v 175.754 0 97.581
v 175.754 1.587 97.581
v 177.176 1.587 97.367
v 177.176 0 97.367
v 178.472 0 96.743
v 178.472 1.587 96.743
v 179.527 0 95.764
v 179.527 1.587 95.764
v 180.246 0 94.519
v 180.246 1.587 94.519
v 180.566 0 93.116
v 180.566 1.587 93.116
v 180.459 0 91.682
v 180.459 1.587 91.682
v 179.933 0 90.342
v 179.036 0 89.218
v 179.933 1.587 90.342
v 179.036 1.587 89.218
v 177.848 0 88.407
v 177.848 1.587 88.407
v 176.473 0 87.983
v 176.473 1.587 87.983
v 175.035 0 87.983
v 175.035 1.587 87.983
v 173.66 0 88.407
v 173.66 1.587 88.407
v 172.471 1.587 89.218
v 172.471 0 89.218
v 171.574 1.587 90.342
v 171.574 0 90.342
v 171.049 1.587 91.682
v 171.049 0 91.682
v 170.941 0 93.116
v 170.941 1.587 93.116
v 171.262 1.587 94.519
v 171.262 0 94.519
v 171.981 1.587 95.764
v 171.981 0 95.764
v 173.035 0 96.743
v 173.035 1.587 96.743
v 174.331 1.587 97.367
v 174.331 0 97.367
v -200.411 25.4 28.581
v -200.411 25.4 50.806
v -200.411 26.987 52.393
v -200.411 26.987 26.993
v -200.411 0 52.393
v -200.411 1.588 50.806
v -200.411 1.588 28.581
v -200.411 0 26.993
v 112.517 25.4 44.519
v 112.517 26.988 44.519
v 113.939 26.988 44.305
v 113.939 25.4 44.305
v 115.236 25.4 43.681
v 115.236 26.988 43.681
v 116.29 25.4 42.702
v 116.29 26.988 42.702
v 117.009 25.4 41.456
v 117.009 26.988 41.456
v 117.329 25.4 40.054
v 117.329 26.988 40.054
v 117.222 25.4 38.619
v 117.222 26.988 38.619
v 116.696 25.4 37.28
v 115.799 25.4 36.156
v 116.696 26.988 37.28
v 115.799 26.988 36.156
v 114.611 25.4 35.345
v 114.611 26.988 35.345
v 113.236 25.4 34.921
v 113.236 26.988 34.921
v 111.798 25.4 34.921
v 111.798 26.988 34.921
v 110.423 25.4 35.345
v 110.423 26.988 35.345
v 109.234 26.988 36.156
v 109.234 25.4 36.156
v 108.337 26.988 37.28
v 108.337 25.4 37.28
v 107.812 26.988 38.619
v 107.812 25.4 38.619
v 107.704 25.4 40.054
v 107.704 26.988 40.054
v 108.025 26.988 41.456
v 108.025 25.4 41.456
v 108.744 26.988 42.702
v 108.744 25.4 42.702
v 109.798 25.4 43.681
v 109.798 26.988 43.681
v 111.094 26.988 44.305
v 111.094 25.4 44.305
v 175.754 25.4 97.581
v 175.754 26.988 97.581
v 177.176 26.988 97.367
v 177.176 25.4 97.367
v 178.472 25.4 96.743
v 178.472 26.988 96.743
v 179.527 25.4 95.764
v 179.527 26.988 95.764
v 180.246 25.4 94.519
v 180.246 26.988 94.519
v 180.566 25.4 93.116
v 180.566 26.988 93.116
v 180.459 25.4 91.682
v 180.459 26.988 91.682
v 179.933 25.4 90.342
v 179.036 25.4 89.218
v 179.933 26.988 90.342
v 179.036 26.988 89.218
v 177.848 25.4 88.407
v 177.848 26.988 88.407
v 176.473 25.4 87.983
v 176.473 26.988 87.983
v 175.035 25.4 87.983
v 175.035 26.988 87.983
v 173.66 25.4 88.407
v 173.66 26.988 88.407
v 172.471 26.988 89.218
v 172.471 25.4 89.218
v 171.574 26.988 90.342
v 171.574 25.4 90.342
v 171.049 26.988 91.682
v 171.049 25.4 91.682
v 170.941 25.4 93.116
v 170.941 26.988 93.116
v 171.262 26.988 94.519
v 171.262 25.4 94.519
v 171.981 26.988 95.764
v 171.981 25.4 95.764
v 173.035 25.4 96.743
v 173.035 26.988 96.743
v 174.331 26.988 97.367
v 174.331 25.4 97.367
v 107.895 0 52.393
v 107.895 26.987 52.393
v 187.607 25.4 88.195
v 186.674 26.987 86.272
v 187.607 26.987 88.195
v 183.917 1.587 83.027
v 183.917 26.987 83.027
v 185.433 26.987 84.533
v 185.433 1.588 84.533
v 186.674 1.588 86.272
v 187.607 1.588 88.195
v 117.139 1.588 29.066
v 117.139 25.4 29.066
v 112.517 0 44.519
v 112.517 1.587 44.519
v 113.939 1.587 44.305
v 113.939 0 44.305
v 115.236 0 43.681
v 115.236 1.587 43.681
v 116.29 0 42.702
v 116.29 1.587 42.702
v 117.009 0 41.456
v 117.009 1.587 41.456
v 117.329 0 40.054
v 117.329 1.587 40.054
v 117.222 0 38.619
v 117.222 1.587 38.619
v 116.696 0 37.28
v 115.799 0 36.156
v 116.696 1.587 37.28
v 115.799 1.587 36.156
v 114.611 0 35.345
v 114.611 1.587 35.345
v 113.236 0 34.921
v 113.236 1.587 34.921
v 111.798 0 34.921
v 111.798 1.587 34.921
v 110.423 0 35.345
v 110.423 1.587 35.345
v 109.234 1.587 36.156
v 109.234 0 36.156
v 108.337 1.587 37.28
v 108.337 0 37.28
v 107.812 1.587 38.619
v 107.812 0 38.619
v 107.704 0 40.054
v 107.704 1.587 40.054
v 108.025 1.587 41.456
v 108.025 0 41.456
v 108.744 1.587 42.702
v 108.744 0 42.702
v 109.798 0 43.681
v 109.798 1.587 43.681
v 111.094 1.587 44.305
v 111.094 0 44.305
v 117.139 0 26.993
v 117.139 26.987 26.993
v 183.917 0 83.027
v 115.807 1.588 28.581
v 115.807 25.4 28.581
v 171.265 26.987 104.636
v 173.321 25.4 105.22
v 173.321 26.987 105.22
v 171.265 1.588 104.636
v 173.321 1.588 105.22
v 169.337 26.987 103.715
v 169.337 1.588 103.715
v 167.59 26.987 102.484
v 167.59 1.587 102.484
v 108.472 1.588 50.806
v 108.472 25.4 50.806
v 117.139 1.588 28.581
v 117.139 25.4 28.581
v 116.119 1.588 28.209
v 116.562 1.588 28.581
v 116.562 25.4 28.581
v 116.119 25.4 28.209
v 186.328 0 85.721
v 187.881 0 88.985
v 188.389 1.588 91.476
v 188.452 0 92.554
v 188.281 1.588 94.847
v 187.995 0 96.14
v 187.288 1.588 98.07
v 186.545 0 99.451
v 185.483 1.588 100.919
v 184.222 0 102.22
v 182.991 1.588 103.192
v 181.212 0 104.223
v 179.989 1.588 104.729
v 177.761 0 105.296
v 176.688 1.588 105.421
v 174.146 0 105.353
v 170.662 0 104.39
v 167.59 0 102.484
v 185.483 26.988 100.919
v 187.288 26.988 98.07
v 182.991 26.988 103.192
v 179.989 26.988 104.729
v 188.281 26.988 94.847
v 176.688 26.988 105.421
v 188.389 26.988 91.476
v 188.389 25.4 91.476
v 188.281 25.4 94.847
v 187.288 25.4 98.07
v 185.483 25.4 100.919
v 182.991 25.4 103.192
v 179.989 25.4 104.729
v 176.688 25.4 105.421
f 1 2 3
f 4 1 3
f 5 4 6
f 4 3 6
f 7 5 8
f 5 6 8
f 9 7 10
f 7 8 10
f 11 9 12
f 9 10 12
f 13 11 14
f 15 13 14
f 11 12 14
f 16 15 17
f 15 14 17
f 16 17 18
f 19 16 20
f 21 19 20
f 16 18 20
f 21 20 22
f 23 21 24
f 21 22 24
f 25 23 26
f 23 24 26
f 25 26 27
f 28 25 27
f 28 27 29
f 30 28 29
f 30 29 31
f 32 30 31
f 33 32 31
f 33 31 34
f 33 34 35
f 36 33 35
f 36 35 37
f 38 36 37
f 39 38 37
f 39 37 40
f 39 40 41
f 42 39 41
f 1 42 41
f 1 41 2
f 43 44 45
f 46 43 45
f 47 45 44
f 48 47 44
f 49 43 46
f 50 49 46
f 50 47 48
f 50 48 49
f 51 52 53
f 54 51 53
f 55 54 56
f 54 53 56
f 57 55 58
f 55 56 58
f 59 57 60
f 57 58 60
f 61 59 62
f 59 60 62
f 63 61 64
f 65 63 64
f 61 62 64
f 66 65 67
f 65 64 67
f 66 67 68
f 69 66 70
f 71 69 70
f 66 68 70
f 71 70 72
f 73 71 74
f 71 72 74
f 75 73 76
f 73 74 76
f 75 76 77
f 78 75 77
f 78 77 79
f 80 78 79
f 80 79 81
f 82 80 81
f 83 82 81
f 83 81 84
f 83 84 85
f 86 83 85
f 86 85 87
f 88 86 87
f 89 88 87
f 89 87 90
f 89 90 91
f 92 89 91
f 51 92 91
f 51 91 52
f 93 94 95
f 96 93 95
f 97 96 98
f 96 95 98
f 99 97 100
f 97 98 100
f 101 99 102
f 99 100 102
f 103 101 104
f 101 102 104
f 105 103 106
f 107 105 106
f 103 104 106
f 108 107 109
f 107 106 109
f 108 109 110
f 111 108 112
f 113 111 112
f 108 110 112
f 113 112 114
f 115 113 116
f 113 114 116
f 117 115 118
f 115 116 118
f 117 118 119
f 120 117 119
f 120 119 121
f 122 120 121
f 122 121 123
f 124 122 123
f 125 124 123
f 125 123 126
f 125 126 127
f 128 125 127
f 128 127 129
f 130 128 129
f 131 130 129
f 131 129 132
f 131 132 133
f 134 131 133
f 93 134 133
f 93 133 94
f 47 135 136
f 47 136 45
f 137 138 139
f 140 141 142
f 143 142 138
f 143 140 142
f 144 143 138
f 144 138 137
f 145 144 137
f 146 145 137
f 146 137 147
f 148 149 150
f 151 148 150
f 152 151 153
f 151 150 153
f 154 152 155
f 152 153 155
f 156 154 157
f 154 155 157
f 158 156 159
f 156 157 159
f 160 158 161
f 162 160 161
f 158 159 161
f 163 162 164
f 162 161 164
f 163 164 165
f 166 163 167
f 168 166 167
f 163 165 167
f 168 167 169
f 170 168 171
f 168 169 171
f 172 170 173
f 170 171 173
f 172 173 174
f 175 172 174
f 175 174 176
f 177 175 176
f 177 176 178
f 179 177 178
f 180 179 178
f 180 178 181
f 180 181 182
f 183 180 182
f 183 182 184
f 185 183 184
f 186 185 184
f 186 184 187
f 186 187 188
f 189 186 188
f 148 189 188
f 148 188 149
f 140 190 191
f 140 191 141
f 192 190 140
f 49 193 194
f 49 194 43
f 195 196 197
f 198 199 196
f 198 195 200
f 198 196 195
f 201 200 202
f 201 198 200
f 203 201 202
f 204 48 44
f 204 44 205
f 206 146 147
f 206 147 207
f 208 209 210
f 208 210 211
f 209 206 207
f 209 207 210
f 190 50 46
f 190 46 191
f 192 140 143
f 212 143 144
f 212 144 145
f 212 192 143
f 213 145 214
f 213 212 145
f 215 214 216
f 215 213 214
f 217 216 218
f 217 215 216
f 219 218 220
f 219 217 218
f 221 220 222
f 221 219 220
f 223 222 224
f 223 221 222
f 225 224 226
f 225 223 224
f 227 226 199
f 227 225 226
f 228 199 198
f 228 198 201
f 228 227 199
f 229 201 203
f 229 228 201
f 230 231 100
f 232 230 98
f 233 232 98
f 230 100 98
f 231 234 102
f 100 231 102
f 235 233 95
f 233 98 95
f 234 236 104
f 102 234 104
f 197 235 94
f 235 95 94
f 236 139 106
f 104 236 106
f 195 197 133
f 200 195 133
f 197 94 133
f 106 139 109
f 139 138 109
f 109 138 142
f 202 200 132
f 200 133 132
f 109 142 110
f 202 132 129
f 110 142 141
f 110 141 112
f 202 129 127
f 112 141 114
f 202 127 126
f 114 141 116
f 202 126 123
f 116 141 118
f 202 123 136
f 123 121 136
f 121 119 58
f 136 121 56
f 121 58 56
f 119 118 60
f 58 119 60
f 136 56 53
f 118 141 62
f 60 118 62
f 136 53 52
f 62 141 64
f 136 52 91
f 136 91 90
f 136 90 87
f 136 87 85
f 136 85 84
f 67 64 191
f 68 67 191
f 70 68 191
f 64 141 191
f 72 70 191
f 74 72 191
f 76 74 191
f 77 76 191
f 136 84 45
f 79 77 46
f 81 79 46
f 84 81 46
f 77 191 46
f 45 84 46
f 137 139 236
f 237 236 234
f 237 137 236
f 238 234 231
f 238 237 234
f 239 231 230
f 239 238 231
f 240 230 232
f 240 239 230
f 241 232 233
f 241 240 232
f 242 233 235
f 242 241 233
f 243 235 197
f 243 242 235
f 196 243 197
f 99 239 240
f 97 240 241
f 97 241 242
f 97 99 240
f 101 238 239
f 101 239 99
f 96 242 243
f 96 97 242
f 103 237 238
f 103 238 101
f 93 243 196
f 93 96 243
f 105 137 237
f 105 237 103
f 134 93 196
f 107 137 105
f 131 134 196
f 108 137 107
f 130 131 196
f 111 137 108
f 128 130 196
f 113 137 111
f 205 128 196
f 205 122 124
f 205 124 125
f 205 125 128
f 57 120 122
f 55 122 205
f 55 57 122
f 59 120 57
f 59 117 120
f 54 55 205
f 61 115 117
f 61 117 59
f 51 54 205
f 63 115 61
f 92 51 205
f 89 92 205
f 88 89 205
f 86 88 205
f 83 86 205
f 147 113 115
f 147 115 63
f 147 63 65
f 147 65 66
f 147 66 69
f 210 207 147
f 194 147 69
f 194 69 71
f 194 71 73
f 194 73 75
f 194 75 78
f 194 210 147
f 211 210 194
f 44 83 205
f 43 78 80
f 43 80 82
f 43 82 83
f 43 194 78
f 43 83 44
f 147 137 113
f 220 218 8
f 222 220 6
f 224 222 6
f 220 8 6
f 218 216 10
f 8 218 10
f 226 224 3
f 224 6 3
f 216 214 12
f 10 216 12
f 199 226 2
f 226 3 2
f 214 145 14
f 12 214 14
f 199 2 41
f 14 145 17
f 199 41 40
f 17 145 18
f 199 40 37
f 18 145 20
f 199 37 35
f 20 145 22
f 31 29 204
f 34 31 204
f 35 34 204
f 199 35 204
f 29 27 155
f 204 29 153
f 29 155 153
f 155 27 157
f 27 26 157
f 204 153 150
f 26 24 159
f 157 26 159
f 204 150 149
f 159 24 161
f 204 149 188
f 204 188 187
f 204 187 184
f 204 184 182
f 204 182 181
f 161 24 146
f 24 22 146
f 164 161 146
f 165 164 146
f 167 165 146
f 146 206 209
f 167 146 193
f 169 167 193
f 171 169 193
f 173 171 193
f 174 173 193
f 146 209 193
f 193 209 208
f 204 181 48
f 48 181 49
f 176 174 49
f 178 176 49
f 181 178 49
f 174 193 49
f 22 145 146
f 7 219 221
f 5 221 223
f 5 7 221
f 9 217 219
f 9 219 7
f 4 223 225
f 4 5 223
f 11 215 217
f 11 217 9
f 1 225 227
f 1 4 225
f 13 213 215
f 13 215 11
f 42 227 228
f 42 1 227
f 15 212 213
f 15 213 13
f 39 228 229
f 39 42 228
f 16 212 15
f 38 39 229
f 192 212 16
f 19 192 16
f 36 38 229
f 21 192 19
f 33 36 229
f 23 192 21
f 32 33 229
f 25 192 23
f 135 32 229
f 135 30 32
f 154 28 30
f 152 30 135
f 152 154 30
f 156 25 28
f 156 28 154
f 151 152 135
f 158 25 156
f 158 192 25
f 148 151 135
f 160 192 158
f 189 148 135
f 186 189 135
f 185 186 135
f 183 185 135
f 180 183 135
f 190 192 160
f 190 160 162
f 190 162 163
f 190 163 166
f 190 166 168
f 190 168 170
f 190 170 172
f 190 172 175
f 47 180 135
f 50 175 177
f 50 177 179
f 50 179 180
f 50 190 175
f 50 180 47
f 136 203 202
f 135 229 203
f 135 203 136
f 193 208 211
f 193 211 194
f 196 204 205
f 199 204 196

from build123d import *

# Parameters (mm, degrees)
BOSS_EXTRUDE1_DEPTH = 1.5875
BOSS_EXTRUDE2_DEPTH = 25.4
BOSS_EXTRUDE3_START = -1.5875
BOSS_EXTRUDE3_DEPTH = 1.5875
SKETCH7_R           = 4.826
CUT_EXTRUDE1_DEPTH  = 45.2755


with BuildPart() as part:
    # Sketch1 → Boss-Extrude1 (new body)
    with BuildSketch(Plane(origin=(0, 0, 0), x_dir=(1, 0, 0), z_dir=(0, 1, 0))):
        with BuildLine():
            Line((167.59049564, -102.48416143), (107.894507528, -52.393279822))
            Line((107.894507528, -52.393279822), (-200.411070496, -52.393279822))
            Line((-200.411070496, -52.393279822), (-200.411070496, -26.993279822))
            Line((-200.411070496, -26.993279822), (117.139351479, -26.993279822))
            Line((117.139351479, -26.993279822), (183.917300926, -83.026632574))
            ThreePointArc((183.917300926, -83.026632574), (185.482662711, -100.918799645), (167.59049564, -102.48416143))
        make_face()
    extrude(amount=BOSS_EXTRUDE1_DEPTH)

    # Sketch2 → Boss-Extrude2 (add)
    with BuildSketch(Plane(origin=(0, 1.5875, 0), x_dir=(1, 0, 0), z_dir=(0, 1, 0))):
        with BuildLine():
            Line((187.606793422, -88.194818438), (117.139351479, -29.065613894))
            Line((117.139351479, -29.065613894), (117.139351479, -28.580779822))
            Line((117.139351479, -28.580779822), (116.561548732, -28.580779822))
            Line((116.561548732, -28.580779822), (116.118926148, -28.209375376))
            Line((116.118926148, -28.209375376), (115.807280814, -28.580779822))
            Line((115.807280814, -28.580779822), (-200.411070496, -28.580779822))
            Line((-200.411070496, -28.580779822), (-200.411070496, -26.993279822))
            Line((-200.411070496, -26.993279822), (117.139351479, -26.993279822))
            Line((117.139351479, -26.993279822), (183.917300926, -83.026632574))
            ThreePointArc((183.917300926, -83.026632574), (186.090270011, -85.376412011), (187.606793422, -88.194818438))
        make_face()
        with BuildLine():
            Line((-200.411070496, -52.393279822), (-200.411070496, -50.805779822))
            Line((-200.411070496, -50.805779822), (108.472310275, -50.805779822))
            Line((108.472310275, -50.805779822), (173.320838796, -105.220156187))
            ThreePointArc((173.320838796, -105.220156187), (170.281908769, -104.216083315), (167.59049564, -102.48416143))
            Line((167.59049564, -102.48416143), (107.894507528, -52.393279822))
            Line((107.894507528, -52.393279822), (-200.411070496, -52.393279822))
        make_face()
    extrude(amount=BOSS_EXTRUDE2_DEPTH)

    # Sketch6 → Boss-Extrude3 (add)
    with BuildSketch(Plane(origin=(0, 26.9875, 0), x_dir=(1, 0, 0), z_dir=(0, 1, 0)).offset(BOSS_EXTRUDE3_START)):
        with BuildLine():
            Line((-200.411070496, -26.993279822), (117.139351479, -26.993279822))
            Line((117.139351479, -26.993279822), (183.917300926, -83.026632574))
            ThreePointArc((183.917300926, -83.026632574), (185.482662711, -100.918799645), (167.59049564, -102.48416143))
            Line((167.59049564, -102.48416143), (107.894507528, -52.393279822))
            Line((107.894507528, -52.393279822), (-200.411070496, -52.393279822))
            Line((-200.411070496, -52.393279822), (-200.411070496, -26.993279822))
        make_face()
    extrude(amount=BOSS_EXTRUDE3_DEPTH)

    # Sketch7 → Cut-Extrude1 (cut)
    with BuildSketch(Plane(origin=(0, 26.9875, 0), x_dir=(1, 0, 0), z_dir=(0, 1, 0))):
        with Locations(Location((175.753898283, -92.755397002, 0), (0, 0, 270))):
            Circle(SKETCH7_R)
        with Locations(Location((112.516929504, -39.693279822, 0), (0, 0, 270))):
            Circle(SKETCH7_R)
    extrude(amount=-CUT_EXTRUDE1_DEPTH, mode=Mode.SUBTRACT)


solid = part.part
